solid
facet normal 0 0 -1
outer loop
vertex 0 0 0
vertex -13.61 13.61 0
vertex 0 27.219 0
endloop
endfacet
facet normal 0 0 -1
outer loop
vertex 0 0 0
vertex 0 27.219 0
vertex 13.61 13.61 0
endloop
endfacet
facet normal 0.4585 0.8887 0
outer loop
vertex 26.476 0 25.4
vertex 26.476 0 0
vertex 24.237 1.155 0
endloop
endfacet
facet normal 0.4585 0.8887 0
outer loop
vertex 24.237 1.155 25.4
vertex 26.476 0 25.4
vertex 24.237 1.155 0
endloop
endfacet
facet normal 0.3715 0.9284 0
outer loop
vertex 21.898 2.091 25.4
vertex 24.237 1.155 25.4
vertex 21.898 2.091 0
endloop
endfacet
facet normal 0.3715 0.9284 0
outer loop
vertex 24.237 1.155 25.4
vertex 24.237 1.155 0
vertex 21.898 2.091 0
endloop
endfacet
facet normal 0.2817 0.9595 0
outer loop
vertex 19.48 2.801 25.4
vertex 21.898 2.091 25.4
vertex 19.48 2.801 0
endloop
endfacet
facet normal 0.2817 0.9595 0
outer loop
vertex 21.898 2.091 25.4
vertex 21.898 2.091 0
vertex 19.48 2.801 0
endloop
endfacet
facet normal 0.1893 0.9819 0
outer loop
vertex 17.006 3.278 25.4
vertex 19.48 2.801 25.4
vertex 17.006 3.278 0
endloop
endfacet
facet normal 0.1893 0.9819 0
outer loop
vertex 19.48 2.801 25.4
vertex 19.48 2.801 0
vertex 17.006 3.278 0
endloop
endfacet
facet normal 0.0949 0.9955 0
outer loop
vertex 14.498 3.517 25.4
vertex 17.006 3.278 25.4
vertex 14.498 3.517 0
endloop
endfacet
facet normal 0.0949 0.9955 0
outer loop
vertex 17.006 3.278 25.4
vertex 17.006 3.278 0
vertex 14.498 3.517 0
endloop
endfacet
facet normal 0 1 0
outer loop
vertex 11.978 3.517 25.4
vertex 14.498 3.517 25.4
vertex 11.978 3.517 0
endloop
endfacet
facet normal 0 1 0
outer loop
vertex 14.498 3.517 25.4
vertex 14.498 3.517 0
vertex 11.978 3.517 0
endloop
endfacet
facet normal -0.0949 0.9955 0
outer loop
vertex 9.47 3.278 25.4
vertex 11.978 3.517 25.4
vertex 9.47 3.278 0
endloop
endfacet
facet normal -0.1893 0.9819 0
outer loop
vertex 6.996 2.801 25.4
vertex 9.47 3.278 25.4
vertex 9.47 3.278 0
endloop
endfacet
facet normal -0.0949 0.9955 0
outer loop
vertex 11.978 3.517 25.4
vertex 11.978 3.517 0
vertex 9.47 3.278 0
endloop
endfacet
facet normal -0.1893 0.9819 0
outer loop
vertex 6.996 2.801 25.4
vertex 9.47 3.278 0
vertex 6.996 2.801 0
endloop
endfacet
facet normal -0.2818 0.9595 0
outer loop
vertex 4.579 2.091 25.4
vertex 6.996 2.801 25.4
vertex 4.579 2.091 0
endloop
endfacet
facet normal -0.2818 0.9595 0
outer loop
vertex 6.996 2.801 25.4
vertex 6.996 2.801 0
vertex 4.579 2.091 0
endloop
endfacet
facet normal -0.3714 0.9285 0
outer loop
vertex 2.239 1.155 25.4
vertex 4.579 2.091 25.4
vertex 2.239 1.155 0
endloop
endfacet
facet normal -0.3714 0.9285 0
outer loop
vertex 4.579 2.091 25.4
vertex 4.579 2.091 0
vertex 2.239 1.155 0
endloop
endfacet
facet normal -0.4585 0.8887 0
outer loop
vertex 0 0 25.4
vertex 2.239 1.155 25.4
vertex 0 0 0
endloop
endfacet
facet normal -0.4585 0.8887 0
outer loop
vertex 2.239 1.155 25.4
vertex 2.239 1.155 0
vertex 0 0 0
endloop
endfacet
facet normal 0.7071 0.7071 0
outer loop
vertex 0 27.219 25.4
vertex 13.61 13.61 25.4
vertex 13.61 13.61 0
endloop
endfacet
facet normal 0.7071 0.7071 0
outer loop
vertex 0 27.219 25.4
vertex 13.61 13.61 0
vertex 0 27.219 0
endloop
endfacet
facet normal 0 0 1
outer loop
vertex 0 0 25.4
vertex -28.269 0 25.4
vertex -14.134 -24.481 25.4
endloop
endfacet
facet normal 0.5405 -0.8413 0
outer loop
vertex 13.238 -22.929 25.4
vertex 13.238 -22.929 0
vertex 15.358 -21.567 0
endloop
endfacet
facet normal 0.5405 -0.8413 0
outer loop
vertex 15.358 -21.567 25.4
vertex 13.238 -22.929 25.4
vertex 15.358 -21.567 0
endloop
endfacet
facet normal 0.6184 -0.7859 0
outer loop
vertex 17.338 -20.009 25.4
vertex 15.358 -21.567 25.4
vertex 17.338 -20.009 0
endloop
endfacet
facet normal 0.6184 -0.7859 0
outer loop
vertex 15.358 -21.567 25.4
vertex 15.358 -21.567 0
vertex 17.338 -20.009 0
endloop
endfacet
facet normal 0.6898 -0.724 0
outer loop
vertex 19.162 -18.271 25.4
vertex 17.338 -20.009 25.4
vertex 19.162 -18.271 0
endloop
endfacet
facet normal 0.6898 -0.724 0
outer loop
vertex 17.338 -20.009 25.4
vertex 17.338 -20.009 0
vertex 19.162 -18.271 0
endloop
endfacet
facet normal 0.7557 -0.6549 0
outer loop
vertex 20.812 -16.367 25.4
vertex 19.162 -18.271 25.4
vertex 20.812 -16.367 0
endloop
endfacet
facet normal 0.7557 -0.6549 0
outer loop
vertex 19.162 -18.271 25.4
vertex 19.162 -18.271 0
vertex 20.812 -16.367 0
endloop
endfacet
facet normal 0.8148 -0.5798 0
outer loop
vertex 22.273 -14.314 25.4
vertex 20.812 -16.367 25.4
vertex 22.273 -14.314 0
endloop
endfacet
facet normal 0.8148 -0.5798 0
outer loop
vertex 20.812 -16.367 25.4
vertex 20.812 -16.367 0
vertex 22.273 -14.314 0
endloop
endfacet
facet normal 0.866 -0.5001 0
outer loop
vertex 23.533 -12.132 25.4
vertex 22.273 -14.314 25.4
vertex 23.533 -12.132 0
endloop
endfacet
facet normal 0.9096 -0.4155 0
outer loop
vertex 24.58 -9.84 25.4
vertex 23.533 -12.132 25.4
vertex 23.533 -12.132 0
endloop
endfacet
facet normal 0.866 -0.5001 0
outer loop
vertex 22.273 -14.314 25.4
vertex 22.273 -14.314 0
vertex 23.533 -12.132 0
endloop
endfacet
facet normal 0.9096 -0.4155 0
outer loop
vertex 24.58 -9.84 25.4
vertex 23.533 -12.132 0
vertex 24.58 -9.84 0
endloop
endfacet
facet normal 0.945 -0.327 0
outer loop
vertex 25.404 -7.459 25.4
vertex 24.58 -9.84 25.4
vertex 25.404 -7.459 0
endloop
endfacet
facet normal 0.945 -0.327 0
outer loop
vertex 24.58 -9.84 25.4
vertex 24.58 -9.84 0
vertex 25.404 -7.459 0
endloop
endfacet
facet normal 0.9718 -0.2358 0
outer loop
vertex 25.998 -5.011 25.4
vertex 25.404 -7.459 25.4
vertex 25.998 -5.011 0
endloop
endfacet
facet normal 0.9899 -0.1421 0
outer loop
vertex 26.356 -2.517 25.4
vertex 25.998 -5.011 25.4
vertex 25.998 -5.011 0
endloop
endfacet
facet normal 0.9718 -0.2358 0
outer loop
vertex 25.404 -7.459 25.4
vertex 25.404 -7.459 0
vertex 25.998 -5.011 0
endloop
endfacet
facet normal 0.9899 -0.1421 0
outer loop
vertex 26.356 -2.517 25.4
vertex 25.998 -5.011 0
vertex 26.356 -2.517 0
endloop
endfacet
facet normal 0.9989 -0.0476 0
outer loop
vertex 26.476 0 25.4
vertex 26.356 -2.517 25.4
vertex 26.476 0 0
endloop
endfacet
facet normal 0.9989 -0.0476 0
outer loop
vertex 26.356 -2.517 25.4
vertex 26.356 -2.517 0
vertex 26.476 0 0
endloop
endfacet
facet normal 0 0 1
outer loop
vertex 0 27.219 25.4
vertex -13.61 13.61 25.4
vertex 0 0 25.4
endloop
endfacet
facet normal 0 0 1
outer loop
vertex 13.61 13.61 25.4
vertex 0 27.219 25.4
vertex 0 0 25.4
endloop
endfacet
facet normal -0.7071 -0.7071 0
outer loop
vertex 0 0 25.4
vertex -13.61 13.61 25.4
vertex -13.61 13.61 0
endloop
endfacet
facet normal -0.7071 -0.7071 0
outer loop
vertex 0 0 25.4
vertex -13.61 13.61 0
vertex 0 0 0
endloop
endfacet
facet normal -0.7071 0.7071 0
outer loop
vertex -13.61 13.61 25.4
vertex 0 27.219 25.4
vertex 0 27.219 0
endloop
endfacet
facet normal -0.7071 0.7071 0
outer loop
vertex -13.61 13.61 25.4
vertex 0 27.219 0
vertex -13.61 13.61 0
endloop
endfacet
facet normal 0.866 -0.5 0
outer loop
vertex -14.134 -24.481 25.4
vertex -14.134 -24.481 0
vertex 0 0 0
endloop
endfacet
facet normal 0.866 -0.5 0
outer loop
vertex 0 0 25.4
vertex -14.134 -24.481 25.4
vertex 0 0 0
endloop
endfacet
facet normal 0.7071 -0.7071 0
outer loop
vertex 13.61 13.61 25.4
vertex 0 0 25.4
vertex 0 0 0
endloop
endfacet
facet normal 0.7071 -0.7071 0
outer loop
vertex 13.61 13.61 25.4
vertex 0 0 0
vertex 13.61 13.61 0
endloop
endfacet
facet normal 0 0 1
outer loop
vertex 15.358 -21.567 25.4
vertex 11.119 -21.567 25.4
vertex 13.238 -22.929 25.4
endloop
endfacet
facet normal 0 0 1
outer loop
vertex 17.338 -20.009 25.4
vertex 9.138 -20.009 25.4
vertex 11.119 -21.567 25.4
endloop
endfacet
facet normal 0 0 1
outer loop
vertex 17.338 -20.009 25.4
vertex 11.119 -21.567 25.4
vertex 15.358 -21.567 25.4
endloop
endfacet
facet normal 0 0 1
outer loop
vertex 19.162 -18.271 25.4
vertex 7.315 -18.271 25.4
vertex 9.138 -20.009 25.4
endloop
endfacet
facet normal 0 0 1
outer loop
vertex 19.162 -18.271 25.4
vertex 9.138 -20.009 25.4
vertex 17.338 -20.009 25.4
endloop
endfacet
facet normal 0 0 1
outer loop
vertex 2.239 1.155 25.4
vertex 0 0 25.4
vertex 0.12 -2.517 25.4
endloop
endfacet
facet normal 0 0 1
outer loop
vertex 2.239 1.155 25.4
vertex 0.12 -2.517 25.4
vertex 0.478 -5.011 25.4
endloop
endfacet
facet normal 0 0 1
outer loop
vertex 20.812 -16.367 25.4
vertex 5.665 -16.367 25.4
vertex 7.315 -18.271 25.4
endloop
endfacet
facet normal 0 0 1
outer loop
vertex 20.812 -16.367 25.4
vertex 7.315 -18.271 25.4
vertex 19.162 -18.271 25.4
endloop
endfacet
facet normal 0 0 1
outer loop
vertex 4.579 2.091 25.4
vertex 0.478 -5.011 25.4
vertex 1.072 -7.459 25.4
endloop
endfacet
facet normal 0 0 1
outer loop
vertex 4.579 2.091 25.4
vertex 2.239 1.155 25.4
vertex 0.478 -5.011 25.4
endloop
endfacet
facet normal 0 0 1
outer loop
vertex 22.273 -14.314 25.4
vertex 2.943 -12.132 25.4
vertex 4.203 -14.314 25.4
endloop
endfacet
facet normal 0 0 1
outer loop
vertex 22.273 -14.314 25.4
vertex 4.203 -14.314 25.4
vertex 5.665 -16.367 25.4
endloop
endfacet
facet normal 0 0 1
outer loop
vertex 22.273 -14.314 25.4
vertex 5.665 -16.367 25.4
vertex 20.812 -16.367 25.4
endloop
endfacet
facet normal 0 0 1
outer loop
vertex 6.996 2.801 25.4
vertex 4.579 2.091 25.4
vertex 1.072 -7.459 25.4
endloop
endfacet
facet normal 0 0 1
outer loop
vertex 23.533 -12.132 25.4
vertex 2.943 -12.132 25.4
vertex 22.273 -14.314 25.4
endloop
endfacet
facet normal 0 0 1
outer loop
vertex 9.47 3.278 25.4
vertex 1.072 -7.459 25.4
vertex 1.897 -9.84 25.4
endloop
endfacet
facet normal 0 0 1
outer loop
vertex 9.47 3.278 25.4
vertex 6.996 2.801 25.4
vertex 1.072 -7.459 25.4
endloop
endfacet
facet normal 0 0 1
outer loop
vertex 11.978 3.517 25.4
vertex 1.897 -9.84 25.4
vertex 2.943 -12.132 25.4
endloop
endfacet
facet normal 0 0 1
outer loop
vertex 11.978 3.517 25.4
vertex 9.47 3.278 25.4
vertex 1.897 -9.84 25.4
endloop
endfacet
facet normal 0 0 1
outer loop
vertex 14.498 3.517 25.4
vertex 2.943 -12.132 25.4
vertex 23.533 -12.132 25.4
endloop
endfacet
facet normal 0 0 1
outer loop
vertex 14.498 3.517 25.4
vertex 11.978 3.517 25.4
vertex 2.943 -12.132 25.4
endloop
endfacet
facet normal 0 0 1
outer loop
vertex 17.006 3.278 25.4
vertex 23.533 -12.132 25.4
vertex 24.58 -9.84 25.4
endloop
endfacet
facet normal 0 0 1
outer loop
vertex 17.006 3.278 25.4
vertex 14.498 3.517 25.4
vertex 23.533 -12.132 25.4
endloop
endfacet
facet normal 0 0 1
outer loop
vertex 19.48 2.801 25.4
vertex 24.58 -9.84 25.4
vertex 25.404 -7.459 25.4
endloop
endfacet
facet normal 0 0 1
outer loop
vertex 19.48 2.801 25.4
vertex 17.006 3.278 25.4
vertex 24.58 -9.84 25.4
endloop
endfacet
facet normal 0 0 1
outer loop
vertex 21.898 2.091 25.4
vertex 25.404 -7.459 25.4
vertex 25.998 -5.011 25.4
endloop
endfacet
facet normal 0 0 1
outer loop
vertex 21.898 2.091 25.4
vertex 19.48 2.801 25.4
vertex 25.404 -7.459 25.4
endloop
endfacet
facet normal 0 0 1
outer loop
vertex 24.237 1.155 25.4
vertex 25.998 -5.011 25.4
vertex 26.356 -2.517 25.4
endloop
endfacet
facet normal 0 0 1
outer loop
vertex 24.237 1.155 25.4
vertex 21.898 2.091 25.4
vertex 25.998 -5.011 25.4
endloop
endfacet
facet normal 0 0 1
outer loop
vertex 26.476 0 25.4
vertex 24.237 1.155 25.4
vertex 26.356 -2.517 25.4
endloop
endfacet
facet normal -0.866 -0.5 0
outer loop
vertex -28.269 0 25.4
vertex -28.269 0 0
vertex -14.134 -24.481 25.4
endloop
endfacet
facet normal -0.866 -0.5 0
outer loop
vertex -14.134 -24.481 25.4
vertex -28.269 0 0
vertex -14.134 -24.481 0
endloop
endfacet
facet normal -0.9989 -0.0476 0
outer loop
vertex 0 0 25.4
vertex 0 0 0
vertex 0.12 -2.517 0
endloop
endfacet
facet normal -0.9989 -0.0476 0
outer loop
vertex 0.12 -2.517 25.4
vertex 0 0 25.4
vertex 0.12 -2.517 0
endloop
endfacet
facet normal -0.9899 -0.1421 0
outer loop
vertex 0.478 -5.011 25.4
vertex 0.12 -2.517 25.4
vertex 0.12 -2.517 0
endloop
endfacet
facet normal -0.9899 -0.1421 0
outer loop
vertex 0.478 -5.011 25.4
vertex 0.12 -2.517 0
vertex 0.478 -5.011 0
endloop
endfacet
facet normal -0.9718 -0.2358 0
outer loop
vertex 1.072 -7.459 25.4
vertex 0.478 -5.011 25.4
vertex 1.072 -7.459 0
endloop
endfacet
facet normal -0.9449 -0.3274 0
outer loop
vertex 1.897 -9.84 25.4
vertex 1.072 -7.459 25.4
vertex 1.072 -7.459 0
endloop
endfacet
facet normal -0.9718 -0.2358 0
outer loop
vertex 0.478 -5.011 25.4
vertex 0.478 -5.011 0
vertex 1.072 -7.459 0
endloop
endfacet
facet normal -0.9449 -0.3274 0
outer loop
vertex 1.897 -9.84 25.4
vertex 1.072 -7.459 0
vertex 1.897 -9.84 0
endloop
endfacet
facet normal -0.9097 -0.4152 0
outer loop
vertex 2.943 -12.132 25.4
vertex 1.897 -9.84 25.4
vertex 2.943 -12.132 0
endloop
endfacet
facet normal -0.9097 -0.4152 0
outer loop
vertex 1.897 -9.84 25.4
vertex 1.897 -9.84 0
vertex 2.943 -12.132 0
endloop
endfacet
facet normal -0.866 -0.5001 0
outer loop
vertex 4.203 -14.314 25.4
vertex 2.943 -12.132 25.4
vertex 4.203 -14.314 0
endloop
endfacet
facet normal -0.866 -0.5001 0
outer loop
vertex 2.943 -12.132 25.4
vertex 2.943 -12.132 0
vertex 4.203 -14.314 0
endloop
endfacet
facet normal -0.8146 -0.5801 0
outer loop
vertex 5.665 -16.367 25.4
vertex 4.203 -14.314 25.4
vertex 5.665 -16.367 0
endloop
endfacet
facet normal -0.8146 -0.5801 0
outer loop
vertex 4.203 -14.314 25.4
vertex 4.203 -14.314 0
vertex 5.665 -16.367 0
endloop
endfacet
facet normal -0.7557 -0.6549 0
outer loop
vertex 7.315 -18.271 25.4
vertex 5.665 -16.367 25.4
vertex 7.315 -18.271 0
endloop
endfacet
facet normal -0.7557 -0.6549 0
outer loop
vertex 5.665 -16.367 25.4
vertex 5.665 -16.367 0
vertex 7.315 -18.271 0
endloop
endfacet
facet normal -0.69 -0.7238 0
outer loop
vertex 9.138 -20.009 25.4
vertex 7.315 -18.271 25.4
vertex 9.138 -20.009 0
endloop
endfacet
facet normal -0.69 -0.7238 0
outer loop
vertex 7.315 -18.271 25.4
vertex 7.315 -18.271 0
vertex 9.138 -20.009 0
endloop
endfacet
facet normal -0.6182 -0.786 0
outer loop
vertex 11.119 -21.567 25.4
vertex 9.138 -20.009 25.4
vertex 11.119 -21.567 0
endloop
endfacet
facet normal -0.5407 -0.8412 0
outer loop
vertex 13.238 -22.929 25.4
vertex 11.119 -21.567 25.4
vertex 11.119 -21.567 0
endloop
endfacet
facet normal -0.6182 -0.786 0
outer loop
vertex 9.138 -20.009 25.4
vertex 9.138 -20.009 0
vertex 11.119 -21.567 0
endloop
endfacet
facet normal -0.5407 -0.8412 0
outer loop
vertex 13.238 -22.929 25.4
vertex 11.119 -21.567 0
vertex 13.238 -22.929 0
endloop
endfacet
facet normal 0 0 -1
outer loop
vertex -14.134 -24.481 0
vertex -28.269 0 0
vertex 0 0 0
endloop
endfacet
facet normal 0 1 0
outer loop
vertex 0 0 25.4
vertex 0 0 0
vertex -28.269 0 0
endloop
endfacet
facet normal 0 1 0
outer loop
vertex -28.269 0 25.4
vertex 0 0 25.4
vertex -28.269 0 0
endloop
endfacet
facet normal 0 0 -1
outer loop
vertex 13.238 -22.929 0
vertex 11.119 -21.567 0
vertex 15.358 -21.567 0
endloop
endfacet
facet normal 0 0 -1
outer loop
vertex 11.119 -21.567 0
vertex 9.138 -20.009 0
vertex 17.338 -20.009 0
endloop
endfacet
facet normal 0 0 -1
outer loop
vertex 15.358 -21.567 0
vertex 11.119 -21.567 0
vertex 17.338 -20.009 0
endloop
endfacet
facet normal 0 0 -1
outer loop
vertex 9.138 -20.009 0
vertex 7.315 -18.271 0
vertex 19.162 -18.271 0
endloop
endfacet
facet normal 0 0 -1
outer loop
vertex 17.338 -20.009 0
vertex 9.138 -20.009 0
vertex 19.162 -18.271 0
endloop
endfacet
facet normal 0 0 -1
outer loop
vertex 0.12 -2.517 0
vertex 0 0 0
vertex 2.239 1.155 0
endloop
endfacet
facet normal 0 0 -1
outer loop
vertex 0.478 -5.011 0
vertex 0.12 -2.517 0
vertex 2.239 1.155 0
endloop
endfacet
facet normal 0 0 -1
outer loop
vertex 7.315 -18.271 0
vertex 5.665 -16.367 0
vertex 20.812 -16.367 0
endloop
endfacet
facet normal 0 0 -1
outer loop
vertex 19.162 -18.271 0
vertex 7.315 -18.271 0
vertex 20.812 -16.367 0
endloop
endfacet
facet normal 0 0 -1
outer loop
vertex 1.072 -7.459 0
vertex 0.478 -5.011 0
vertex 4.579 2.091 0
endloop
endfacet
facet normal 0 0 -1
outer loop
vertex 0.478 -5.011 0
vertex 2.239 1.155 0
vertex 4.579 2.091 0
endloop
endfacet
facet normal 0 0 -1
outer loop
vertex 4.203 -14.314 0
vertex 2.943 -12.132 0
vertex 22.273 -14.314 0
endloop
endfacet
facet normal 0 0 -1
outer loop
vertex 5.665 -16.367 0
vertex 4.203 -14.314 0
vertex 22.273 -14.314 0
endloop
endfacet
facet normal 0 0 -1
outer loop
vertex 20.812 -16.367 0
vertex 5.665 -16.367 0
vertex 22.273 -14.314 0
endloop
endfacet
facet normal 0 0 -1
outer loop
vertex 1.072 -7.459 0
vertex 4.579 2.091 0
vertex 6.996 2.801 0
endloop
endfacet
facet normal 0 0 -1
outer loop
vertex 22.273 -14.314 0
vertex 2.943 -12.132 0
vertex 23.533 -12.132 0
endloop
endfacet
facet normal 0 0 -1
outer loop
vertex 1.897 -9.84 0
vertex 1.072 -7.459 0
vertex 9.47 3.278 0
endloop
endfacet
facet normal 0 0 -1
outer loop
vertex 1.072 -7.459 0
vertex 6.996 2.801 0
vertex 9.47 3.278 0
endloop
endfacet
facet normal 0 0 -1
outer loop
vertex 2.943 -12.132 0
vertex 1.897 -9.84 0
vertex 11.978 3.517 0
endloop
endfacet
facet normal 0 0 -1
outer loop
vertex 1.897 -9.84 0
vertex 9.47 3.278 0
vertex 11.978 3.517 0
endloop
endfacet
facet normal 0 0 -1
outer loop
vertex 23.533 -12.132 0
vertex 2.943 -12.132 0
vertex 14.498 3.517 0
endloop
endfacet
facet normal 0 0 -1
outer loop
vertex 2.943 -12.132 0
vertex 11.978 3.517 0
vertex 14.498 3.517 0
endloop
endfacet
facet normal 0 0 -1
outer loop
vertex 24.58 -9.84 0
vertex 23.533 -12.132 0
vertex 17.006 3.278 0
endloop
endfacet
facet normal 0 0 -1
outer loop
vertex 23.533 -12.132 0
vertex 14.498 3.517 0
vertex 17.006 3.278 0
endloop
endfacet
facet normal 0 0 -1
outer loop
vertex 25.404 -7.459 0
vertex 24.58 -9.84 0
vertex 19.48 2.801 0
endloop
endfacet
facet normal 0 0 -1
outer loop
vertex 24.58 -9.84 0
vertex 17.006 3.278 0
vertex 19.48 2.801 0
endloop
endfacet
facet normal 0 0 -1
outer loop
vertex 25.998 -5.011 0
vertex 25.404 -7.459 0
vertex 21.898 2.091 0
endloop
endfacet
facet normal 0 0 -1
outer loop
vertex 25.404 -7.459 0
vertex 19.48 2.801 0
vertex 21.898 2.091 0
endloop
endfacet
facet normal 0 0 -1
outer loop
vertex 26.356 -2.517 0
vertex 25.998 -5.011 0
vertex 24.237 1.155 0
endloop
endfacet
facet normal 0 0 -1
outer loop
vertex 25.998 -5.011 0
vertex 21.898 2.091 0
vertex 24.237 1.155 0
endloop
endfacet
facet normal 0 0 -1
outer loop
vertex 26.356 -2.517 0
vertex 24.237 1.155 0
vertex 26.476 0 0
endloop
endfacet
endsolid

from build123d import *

# Parameters (mm, degrees)
F1_DEPTH = 25.4
F3_DEPTH = 25.4
F5_DEPTH = 25.4


with BuildPart() as f1:
    # F0 (on Top) → F1 (new body)
    with BuildSketch(Plane.XY):
        Polygon((0, 0), (-28.2685179263, 0), (-14.1342589632, -24.4812546515), align=None)
    extrude(amount=F1_DEPTH)


with BuildPart() as f3:
    # F2 (on Top) → F3 (new body)
    with BuildSketch(Plane.XY):
        with BuildLine():
            ThreePointArc((13.2381515749, -22.9291511259), (22.9291511259, -13.2381515749), (26.4763031497, 0))
            ThreePointArc((26.4763031497, 0), (13.2381515749, 3.5471520238), (0, 0))
            ThreePointArc((0, 0), (3.5471520238, -13.2381515749), (13.2381515749, -22.9291511259))
        make_face()
    extrude(amount=F3_DEPTH)


with BuildPart() as f5:
    # F4 (on Top) → F5 (new body)
    with BuildSketch(Plane.XY):
        Polygon((13.6095220223, 13.6095220223), (0, 27.2190440446), (-13.6095220223, 13.6095220223), (0, 0), align=None)
    extrude(amount=F5_DEPTH)


solid = Compound([f1.part, f3.part, f5.part])
